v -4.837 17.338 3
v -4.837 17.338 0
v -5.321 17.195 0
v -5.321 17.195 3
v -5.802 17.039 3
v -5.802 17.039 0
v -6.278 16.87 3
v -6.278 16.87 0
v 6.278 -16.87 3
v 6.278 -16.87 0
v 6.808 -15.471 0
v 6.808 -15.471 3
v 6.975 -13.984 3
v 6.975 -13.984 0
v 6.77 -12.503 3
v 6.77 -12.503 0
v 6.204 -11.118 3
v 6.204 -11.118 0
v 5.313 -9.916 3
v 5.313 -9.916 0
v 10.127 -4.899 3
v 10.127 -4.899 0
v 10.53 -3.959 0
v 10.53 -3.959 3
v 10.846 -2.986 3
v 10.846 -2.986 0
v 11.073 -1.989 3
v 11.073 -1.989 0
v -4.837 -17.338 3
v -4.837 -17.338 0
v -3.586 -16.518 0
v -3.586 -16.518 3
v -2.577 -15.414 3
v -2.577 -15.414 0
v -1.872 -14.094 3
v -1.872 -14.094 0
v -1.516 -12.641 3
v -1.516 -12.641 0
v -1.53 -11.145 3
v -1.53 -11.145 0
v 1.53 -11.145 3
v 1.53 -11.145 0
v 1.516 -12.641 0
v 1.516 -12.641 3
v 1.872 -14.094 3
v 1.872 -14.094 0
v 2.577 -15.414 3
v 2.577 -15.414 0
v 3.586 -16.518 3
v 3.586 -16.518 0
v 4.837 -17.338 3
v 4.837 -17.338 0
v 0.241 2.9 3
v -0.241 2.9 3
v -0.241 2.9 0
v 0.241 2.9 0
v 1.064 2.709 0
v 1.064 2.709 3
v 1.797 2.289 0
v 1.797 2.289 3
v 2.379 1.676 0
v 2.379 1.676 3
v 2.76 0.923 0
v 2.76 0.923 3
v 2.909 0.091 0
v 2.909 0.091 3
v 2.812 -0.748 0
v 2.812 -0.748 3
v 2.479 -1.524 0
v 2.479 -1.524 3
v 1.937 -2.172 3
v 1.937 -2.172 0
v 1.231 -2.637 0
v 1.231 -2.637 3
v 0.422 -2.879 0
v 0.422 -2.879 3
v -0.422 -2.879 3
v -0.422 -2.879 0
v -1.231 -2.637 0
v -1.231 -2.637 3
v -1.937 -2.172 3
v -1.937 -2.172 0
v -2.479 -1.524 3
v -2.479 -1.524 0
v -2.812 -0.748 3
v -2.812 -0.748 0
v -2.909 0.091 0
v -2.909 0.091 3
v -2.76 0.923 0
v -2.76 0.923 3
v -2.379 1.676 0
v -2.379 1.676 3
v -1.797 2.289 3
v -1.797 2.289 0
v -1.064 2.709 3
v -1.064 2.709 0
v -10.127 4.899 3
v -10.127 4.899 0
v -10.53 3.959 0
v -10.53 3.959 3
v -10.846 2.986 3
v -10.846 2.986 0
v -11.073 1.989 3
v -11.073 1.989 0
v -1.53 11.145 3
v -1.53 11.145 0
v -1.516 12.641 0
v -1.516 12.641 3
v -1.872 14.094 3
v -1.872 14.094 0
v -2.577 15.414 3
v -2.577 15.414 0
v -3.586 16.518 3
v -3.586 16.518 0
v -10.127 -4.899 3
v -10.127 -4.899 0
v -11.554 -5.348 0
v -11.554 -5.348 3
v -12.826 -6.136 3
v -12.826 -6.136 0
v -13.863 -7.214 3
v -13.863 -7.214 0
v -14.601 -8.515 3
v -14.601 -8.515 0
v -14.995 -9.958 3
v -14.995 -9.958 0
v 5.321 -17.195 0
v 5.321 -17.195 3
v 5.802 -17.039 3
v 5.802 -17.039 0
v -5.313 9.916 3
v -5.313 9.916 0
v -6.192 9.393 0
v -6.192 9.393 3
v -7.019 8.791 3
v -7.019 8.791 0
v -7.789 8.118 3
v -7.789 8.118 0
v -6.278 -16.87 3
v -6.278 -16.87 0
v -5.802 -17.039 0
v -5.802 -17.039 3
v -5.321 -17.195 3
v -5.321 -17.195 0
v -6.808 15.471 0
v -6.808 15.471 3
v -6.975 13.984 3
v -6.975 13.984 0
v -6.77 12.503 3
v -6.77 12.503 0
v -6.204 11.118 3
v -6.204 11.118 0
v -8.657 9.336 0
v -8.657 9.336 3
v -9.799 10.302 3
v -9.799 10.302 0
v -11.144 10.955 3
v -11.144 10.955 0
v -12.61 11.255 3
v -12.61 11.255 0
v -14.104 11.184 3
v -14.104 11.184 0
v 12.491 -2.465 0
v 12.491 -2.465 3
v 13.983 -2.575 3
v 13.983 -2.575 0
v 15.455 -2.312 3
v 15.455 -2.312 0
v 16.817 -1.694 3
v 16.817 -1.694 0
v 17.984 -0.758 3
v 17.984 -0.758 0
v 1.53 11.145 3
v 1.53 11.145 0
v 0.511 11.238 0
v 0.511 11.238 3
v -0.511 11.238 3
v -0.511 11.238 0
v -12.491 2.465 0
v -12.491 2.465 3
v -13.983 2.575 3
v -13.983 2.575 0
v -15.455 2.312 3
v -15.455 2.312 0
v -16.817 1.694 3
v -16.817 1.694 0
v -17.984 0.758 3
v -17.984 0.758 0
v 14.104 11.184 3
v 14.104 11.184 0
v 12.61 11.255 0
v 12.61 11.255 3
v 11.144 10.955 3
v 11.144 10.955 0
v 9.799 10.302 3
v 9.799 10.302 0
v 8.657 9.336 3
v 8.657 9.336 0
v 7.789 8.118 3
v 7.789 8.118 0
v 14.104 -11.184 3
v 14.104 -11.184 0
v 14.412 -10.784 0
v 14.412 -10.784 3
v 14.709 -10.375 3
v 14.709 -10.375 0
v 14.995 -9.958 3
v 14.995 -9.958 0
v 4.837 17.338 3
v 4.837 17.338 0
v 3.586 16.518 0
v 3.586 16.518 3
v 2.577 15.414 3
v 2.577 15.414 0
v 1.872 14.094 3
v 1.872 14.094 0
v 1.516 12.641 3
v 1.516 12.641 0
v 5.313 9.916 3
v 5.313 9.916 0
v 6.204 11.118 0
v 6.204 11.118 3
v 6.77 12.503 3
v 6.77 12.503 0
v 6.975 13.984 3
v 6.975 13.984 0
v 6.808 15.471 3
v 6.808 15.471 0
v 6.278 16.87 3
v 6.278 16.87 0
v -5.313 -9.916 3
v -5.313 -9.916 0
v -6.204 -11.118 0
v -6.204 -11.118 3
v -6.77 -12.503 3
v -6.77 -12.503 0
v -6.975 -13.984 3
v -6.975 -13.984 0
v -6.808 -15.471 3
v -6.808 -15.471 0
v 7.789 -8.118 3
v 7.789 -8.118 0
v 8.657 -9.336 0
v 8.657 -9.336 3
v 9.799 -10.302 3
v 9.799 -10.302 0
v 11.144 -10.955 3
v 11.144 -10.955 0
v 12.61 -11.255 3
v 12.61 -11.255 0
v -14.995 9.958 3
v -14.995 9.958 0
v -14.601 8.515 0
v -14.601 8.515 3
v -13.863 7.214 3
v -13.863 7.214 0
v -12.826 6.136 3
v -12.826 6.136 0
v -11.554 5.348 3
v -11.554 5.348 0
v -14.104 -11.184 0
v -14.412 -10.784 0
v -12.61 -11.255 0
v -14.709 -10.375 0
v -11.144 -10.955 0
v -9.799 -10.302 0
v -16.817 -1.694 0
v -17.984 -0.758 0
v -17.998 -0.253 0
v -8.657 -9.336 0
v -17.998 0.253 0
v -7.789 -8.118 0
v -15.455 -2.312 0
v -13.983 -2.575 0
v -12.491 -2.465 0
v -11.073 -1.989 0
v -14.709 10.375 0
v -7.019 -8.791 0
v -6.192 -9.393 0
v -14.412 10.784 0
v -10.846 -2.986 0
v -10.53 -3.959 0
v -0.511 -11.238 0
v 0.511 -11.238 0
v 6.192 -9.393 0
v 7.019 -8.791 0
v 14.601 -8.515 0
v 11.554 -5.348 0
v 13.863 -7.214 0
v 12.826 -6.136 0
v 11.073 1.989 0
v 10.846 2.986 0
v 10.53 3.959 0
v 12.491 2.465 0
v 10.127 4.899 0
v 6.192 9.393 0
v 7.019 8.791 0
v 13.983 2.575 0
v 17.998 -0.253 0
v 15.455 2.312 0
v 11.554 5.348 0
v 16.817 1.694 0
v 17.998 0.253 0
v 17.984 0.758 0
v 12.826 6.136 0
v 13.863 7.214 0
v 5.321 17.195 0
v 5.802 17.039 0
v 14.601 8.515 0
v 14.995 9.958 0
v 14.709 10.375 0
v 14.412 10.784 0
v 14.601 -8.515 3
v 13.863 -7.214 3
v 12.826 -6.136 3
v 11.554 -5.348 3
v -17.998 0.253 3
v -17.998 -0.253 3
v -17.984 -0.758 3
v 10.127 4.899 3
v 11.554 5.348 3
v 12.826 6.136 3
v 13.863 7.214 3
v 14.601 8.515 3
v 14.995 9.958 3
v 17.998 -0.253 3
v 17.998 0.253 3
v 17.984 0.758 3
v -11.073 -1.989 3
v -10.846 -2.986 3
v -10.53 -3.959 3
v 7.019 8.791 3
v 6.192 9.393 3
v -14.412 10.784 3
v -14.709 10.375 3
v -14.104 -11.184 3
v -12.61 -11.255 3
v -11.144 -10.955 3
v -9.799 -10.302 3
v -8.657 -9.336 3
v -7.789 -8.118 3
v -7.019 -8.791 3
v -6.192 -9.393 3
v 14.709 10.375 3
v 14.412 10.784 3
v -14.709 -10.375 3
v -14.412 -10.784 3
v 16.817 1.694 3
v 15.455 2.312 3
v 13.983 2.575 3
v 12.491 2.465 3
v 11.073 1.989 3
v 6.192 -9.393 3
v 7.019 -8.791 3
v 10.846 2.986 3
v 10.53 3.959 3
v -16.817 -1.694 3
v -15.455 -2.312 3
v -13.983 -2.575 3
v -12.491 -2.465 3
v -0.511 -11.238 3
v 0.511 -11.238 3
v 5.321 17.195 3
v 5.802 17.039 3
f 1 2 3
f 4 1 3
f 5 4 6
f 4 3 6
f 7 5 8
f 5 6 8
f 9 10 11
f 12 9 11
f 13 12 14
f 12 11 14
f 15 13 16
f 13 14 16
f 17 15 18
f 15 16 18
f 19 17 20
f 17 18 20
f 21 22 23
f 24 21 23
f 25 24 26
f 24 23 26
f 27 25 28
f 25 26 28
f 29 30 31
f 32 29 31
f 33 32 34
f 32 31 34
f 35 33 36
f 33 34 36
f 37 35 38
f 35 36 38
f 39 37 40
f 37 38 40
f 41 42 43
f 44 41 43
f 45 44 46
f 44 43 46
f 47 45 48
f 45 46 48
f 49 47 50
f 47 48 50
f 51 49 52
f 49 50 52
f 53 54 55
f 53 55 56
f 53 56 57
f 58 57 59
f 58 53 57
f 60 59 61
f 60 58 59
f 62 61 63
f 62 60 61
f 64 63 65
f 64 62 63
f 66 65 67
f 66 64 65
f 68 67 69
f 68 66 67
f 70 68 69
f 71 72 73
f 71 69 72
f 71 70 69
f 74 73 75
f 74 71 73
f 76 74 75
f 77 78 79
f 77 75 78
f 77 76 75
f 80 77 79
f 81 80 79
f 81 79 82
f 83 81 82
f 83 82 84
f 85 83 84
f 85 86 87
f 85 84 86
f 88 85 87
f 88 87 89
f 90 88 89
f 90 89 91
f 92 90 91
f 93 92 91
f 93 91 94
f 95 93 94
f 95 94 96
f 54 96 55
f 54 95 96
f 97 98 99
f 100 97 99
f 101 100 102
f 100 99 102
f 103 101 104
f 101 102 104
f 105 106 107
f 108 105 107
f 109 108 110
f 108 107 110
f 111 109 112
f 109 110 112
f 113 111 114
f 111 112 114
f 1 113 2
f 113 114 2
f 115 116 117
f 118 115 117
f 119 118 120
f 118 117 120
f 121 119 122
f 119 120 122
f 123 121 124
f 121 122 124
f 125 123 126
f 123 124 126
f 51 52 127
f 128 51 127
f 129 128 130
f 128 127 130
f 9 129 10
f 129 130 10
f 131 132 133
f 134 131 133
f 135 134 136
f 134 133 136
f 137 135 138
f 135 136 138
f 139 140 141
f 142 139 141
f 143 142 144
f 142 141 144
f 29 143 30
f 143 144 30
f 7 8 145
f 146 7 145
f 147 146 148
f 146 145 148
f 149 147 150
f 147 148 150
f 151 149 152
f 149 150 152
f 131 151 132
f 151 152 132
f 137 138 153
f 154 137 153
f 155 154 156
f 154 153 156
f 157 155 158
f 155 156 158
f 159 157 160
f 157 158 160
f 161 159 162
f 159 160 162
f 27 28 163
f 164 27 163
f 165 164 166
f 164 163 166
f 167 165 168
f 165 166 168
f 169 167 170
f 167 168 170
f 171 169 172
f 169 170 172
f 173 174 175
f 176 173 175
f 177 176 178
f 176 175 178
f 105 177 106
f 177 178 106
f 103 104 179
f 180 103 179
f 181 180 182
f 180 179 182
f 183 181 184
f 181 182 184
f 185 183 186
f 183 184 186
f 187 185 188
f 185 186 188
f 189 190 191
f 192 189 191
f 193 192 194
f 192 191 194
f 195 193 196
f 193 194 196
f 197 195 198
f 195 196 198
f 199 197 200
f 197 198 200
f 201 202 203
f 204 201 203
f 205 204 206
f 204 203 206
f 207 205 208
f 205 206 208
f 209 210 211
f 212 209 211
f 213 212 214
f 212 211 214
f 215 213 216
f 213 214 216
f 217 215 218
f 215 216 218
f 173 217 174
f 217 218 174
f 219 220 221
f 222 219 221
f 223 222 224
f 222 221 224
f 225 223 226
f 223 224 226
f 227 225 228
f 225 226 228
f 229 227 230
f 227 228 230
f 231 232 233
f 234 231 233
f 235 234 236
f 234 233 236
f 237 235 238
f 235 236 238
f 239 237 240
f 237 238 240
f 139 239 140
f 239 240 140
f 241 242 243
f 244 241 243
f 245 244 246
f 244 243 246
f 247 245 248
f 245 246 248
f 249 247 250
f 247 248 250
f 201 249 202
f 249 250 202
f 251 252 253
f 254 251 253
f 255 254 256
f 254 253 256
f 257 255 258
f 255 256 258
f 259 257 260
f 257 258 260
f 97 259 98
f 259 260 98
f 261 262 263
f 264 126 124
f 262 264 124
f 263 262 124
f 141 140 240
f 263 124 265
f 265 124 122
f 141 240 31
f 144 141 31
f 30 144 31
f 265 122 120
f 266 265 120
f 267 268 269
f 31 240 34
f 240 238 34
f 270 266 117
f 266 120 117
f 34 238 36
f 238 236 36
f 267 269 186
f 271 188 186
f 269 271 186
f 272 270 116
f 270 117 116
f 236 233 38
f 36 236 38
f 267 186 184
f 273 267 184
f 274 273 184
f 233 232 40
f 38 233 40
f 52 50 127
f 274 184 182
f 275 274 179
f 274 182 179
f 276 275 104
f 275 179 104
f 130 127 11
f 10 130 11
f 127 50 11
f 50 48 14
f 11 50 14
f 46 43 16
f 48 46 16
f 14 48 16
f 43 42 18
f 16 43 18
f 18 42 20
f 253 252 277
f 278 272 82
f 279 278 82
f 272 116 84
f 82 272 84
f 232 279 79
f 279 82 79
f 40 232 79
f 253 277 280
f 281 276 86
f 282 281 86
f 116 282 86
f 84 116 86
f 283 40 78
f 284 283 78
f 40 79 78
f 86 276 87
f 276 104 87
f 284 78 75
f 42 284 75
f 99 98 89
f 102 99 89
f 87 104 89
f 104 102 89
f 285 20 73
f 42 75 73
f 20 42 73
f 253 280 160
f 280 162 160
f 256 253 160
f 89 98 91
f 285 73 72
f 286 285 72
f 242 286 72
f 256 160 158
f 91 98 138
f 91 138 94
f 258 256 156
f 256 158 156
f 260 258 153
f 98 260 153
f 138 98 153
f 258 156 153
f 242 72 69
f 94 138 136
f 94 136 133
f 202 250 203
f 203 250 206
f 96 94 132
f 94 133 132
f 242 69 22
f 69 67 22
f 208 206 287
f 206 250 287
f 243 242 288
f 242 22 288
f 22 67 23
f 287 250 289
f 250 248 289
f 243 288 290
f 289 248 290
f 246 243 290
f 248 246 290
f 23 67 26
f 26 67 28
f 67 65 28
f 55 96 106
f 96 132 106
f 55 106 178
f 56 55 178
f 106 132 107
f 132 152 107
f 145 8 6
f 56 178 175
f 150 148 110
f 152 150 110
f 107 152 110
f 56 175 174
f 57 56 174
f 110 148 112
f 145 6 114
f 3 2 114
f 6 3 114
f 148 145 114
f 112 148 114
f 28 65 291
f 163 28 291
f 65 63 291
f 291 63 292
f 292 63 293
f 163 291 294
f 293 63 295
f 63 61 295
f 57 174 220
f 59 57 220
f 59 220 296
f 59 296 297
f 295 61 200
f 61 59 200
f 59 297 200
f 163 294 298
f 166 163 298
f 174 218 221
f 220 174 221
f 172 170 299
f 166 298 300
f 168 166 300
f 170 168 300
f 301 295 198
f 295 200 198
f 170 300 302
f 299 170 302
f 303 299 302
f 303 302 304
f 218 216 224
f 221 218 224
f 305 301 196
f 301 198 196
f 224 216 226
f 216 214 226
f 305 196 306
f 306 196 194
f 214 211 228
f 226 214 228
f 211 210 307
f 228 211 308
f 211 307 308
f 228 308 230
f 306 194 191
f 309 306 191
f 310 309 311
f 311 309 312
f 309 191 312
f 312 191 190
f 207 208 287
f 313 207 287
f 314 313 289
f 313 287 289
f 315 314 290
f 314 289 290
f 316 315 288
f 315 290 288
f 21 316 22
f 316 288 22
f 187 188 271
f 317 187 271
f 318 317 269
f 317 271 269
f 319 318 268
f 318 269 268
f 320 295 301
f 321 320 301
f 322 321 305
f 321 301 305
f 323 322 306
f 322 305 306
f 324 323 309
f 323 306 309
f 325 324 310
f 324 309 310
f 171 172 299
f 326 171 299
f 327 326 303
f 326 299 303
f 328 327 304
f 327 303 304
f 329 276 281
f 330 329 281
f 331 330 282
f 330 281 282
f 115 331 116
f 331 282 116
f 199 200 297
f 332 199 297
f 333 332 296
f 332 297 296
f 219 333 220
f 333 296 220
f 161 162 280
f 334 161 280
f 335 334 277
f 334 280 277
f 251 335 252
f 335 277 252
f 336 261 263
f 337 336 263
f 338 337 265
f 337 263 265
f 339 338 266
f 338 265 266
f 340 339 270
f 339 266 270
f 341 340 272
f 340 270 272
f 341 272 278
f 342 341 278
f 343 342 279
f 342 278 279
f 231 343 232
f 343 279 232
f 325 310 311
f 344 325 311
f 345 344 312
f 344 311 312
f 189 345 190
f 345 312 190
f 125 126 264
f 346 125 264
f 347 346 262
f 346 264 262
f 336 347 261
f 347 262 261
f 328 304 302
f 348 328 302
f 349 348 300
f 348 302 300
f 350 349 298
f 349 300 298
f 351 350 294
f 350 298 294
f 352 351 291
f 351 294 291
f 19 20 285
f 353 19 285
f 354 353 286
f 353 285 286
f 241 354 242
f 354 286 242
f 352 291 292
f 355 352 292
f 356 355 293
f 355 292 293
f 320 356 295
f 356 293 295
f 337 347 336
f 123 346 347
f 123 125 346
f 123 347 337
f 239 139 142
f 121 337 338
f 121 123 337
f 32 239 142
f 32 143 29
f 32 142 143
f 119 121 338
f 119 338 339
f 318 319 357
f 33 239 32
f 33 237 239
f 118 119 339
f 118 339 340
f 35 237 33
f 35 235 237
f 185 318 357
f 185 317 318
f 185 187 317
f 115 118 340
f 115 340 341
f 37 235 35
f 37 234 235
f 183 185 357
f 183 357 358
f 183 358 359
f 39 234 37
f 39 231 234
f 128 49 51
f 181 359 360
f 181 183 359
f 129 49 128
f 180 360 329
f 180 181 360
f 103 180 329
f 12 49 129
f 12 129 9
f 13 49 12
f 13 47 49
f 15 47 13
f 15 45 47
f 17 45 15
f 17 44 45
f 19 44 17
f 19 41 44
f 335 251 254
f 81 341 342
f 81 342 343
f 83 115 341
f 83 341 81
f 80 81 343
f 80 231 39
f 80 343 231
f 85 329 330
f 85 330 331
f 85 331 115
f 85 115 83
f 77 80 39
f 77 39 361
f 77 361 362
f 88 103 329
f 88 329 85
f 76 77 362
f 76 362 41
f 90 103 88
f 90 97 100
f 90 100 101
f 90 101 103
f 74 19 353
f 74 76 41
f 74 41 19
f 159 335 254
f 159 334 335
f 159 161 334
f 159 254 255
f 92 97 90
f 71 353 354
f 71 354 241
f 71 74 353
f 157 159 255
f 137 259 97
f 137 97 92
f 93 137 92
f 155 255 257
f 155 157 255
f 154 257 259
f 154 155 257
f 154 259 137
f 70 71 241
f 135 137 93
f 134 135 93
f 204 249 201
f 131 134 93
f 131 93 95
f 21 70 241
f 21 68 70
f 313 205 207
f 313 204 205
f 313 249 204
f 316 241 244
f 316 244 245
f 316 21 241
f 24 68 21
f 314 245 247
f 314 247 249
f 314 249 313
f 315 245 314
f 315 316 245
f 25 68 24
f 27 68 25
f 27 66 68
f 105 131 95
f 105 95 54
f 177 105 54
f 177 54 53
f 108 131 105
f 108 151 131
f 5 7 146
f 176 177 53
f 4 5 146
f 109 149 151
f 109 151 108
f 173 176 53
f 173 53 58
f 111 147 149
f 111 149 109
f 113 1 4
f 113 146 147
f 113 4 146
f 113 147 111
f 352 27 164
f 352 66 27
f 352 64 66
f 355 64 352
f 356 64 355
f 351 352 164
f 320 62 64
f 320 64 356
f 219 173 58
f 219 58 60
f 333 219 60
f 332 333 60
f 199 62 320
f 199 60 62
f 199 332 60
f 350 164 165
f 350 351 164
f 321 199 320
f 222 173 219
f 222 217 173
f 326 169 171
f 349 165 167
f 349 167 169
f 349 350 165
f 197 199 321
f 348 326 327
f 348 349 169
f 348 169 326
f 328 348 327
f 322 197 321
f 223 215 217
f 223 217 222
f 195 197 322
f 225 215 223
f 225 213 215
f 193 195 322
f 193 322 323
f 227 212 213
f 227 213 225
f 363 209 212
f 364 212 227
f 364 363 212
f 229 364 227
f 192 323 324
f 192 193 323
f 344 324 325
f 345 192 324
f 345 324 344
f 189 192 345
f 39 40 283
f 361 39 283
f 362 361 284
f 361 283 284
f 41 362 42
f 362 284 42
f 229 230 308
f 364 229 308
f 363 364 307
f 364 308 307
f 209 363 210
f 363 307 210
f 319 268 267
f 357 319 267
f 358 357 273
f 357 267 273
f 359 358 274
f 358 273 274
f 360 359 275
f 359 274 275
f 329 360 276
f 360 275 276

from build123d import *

# Parameters (mm, degrees)
SKETCH1_R           = 18
BOSS_EXTRUDE1_DEPTH = 3
CUT_EXTRUDE1_START  = -3
CUT_EXTRUDE1_DEPTH  = 3
CIRPATTERN1_COUNT   = 10
CUT_EXTRUDE3_DEPTH  = 26.171545449


with BuildPart() as part:
    # Sketch1 → Boss-Extrude1 (new body)
    with BuildSketch(Plane.XY):
        Circle(SKETCH1_R)
    extrude(amount=BOSS_EXTRUDE1_DEPTH)

    # Sketch2 → Cut-Extrude1 (cut)
    with BuildSketch(Plane.XY.offset(3).offset(CUT_EXTRUDE1_START)):
        with BuildLine():
            ThreePointArc((4.836662041, 17.338013159), (2.183107171, 14.775836074), (1.52990268, 11.145487777))
            ThreePointArc((1.52990268, 11.145487777), (0, 11.25), (-1.52990268, 11.145487777))
            ThreePointArc((-1.52990268, 11.145487777), (-2.183107171, 14.775836074), (-4.836662041, 17.338013159))
            ThreePointArc((-4.836662041, 17.338013159), (0, 18), (4.836662041, 17.338013159))
        make_face()
    cut_extrude1 = extrude(amount=CUT_EXTRUDE1_DEPTH, mode=Mode.SUBTRACT)

    # CirPattern1: Cut-Extrude1 ×10 about axis
    cirpattern1_axis = Axis((0, 0, 0), (0, 0, 1))
    for i in range(1, CIRPATTERN1_COUNT):
        add(cut_extrude1.rotate(cirpattern1_axis, i * 360 / CIRPATTERN1_COUNT), mode=Mode.SUBTRACT)

    # Sketch4 → Cut-Extrude3 (cut, through all)
    with BuildSketch(Plane.XY.offset(3)):
        with BuildLine():
            Line((-0.241039416, 2.9), (0.241039416, 2.9))
            ThreePointArc((0.241039416, 2.9), (0, -2.91), (-0.241039416, 2.9))
        make_face()
    extrude(amount=-CUT_EXTRUDE3_DEPTH, mode=Mode.SUBTRACT)


solid = part.part
